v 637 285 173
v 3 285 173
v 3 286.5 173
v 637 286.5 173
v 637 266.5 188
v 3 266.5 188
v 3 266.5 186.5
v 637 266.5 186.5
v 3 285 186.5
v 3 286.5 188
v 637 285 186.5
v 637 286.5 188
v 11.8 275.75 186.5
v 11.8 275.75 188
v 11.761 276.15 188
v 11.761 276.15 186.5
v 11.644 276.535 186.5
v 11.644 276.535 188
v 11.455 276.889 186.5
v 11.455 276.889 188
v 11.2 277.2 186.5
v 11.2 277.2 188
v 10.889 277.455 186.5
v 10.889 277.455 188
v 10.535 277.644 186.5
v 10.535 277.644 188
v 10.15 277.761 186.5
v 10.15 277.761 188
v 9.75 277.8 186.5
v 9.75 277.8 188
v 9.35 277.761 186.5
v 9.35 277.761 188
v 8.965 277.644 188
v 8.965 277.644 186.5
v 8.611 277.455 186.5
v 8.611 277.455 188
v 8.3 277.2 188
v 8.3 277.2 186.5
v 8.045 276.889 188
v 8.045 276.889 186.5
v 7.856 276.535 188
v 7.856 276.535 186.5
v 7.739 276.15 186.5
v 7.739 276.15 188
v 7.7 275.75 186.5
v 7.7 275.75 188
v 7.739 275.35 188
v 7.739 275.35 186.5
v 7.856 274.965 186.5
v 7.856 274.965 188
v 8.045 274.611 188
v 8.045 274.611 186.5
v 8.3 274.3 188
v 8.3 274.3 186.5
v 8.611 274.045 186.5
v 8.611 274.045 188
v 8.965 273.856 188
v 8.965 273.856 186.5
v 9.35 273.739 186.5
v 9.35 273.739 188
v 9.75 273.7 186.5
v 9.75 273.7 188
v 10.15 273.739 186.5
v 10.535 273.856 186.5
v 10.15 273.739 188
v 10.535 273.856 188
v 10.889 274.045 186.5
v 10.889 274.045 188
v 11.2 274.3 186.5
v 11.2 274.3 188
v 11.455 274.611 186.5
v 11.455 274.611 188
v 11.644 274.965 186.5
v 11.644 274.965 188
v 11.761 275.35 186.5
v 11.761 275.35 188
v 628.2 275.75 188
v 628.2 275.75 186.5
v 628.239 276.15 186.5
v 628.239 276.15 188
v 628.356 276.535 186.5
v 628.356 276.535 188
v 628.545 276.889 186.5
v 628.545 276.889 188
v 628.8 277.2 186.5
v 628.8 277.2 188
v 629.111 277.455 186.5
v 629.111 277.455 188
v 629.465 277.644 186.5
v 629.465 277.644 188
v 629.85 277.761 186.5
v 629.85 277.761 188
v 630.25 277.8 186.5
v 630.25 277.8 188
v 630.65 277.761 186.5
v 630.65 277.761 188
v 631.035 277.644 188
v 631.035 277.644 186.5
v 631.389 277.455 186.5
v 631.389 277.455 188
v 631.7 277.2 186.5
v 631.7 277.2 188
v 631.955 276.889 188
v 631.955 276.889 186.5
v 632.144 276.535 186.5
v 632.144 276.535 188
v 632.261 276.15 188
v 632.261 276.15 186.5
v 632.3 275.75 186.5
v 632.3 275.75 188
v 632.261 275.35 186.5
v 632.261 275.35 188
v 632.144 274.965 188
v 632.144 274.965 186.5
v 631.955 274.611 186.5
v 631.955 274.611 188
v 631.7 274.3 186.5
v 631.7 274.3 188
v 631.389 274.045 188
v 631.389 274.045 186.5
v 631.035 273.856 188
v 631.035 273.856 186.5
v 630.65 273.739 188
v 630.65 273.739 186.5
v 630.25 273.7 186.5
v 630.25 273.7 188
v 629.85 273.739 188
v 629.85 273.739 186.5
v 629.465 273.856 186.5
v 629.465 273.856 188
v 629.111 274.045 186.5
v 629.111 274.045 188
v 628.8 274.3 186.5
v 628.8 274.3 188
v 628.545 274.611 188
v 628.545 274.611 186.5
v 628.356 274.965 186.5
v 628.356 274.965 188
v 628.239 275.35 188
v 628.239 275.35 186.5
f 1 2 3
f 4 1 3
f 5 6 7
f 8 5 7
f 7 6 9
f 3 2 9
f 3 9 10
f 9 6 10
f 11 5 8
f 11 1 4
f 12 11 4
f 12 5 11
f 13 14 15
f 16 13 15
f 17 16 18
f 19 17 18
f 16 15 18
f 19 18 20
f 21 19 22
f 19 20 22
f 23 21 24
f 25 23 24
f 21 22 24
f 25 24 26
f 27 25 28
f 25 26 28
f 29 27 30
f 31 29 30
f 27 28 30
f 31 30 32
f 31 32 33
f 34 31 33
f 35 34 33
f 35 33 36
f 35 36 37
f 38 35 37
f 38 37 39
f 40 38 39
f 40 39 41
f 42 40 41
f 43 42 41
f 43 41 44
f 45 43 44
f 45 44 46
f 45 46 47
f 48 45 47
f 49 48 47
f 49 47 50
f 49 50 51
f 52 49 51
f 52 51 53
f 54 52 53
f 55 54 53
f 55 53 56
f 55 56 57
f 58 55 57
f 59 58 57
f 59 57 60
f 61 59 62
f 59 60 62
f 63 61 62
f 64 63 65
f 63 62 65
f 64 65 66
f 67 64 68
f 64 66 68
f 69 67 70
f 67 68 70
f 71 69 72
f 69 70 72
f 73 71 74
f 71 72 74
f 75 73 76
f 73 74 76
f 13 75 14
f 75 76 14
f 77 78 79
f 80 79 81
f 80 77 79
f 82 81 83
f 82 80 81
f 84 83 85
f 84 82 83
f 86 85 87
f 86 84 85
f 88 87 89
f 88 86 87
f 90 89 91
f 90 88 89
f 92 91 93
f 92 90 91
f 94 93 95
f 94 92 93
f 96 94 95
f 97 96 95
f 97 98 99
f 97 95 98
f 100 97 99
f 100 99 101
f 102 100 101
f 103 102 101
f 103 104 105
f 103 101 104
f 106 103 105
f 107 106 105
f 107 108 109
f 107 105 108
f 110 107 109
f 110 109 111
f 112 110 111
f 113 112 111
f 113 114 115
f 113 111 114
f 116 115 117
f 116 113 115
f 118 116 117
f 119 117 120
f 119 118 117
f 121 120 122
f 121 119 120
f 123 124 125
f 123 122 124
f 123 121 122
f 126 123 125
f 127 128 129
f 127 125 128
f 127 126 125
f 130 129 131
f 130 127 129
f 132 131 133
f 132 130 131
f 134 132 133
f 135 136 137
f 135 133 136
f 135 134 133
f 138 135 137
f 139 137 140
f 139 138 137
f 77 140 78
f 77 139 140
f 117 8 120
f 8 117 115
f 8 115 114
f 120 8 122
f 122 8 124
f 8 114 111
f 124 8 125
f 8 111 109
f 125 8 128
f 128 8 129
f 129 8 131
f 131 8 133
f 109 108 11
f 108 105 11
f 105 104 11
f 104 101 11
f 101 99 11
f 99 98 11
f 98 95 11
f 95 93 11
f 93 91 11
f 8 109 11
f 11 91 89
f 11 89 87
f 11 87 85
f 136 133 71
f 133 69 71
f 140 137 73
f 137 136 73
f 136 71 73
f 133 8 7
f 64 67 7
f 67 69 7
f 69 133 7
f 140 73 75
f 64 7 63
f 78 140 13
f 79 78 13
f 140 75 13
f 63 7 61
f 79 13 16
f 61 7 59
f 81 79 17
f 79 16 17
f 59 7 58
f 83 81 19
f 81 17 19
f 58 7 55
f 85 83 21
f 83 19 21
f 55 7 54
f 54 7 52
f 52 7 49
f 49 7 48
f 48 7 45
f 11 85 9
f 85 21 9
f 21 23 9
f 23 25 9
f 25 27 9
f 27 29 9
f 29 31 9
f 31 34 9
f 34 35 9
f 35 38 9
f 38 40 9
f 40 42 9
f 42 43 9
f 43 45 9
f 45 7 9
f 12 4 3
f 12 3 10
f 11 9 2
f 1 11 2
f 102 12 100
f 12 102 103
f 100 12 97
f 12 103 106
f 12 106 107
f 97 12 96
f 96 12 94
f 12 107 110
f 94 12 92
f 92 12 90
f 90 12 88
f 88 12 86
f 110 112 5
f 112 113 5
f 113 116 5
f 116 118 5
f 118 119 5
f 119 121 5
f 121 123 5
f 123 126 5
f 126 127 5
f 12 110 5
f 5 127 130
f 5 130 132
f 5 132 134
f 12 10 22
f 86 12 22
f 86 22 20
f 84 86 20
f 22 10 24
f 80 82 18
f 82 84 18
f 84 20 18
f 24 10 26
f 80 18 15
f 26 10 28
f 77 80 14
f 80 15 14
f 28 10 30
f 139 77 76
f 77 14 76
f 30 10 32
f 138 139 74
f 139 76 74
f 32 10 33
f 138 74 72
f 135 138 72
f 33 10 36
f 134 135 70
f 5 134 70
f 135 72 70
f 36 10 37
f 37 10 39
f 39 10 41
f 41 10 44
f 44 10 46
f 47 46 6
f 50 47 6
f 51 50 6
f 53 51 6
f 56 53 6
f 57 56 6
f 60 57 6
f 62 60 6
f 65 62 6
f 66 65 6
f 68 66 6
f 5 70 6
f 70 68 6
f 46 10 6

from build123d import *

# Parameters (mm, degrees)
EXTRUDE001_DEPTH = 634
SKETCH020_R      = 2.05
HOLE013_DEPTH    = 1283.986422


with BuildPart() as part:
    # Sketch → Extrude001 (new body)
    with BuildSketch(Plane(origin=(0, 0, 0), x_dir=(0, -1, 0), z_dir=(-1, 0, 0))):
        Polygon((-20, 0), (-20, 15), (0, 15), (0, 13.5), (-18.5, 13.5), (-18.5, 0), align=None)
    extrude(amount=-EXTRUDE001_DEPTH)

    # Sketch020 → Hole013 (cut, through all)
    with BuildSketch(Plane.XY.offset(15)):
        with Locations((6.75, 9.25)):
            Circle(SKETCH020_R)
    hole013 = extrude(amount=-HOLE013_DEPTH, mode=Mode.SUBTRACT)

    # Mirrored007: Hole013 across Sketch020 Axis0
    add(hole013.mirror(Plane(origin=(317, 18.5, 15), x_dir=(0, 0, 1), z_dir=(1, 0, 0))), mode=Mode.SUBTRACT)


with BuildPart() as part_1:
    # Body006 placement: moved
    add(part.part.moved(Location((3, 266.5, 173))))


solid = part_1.part
